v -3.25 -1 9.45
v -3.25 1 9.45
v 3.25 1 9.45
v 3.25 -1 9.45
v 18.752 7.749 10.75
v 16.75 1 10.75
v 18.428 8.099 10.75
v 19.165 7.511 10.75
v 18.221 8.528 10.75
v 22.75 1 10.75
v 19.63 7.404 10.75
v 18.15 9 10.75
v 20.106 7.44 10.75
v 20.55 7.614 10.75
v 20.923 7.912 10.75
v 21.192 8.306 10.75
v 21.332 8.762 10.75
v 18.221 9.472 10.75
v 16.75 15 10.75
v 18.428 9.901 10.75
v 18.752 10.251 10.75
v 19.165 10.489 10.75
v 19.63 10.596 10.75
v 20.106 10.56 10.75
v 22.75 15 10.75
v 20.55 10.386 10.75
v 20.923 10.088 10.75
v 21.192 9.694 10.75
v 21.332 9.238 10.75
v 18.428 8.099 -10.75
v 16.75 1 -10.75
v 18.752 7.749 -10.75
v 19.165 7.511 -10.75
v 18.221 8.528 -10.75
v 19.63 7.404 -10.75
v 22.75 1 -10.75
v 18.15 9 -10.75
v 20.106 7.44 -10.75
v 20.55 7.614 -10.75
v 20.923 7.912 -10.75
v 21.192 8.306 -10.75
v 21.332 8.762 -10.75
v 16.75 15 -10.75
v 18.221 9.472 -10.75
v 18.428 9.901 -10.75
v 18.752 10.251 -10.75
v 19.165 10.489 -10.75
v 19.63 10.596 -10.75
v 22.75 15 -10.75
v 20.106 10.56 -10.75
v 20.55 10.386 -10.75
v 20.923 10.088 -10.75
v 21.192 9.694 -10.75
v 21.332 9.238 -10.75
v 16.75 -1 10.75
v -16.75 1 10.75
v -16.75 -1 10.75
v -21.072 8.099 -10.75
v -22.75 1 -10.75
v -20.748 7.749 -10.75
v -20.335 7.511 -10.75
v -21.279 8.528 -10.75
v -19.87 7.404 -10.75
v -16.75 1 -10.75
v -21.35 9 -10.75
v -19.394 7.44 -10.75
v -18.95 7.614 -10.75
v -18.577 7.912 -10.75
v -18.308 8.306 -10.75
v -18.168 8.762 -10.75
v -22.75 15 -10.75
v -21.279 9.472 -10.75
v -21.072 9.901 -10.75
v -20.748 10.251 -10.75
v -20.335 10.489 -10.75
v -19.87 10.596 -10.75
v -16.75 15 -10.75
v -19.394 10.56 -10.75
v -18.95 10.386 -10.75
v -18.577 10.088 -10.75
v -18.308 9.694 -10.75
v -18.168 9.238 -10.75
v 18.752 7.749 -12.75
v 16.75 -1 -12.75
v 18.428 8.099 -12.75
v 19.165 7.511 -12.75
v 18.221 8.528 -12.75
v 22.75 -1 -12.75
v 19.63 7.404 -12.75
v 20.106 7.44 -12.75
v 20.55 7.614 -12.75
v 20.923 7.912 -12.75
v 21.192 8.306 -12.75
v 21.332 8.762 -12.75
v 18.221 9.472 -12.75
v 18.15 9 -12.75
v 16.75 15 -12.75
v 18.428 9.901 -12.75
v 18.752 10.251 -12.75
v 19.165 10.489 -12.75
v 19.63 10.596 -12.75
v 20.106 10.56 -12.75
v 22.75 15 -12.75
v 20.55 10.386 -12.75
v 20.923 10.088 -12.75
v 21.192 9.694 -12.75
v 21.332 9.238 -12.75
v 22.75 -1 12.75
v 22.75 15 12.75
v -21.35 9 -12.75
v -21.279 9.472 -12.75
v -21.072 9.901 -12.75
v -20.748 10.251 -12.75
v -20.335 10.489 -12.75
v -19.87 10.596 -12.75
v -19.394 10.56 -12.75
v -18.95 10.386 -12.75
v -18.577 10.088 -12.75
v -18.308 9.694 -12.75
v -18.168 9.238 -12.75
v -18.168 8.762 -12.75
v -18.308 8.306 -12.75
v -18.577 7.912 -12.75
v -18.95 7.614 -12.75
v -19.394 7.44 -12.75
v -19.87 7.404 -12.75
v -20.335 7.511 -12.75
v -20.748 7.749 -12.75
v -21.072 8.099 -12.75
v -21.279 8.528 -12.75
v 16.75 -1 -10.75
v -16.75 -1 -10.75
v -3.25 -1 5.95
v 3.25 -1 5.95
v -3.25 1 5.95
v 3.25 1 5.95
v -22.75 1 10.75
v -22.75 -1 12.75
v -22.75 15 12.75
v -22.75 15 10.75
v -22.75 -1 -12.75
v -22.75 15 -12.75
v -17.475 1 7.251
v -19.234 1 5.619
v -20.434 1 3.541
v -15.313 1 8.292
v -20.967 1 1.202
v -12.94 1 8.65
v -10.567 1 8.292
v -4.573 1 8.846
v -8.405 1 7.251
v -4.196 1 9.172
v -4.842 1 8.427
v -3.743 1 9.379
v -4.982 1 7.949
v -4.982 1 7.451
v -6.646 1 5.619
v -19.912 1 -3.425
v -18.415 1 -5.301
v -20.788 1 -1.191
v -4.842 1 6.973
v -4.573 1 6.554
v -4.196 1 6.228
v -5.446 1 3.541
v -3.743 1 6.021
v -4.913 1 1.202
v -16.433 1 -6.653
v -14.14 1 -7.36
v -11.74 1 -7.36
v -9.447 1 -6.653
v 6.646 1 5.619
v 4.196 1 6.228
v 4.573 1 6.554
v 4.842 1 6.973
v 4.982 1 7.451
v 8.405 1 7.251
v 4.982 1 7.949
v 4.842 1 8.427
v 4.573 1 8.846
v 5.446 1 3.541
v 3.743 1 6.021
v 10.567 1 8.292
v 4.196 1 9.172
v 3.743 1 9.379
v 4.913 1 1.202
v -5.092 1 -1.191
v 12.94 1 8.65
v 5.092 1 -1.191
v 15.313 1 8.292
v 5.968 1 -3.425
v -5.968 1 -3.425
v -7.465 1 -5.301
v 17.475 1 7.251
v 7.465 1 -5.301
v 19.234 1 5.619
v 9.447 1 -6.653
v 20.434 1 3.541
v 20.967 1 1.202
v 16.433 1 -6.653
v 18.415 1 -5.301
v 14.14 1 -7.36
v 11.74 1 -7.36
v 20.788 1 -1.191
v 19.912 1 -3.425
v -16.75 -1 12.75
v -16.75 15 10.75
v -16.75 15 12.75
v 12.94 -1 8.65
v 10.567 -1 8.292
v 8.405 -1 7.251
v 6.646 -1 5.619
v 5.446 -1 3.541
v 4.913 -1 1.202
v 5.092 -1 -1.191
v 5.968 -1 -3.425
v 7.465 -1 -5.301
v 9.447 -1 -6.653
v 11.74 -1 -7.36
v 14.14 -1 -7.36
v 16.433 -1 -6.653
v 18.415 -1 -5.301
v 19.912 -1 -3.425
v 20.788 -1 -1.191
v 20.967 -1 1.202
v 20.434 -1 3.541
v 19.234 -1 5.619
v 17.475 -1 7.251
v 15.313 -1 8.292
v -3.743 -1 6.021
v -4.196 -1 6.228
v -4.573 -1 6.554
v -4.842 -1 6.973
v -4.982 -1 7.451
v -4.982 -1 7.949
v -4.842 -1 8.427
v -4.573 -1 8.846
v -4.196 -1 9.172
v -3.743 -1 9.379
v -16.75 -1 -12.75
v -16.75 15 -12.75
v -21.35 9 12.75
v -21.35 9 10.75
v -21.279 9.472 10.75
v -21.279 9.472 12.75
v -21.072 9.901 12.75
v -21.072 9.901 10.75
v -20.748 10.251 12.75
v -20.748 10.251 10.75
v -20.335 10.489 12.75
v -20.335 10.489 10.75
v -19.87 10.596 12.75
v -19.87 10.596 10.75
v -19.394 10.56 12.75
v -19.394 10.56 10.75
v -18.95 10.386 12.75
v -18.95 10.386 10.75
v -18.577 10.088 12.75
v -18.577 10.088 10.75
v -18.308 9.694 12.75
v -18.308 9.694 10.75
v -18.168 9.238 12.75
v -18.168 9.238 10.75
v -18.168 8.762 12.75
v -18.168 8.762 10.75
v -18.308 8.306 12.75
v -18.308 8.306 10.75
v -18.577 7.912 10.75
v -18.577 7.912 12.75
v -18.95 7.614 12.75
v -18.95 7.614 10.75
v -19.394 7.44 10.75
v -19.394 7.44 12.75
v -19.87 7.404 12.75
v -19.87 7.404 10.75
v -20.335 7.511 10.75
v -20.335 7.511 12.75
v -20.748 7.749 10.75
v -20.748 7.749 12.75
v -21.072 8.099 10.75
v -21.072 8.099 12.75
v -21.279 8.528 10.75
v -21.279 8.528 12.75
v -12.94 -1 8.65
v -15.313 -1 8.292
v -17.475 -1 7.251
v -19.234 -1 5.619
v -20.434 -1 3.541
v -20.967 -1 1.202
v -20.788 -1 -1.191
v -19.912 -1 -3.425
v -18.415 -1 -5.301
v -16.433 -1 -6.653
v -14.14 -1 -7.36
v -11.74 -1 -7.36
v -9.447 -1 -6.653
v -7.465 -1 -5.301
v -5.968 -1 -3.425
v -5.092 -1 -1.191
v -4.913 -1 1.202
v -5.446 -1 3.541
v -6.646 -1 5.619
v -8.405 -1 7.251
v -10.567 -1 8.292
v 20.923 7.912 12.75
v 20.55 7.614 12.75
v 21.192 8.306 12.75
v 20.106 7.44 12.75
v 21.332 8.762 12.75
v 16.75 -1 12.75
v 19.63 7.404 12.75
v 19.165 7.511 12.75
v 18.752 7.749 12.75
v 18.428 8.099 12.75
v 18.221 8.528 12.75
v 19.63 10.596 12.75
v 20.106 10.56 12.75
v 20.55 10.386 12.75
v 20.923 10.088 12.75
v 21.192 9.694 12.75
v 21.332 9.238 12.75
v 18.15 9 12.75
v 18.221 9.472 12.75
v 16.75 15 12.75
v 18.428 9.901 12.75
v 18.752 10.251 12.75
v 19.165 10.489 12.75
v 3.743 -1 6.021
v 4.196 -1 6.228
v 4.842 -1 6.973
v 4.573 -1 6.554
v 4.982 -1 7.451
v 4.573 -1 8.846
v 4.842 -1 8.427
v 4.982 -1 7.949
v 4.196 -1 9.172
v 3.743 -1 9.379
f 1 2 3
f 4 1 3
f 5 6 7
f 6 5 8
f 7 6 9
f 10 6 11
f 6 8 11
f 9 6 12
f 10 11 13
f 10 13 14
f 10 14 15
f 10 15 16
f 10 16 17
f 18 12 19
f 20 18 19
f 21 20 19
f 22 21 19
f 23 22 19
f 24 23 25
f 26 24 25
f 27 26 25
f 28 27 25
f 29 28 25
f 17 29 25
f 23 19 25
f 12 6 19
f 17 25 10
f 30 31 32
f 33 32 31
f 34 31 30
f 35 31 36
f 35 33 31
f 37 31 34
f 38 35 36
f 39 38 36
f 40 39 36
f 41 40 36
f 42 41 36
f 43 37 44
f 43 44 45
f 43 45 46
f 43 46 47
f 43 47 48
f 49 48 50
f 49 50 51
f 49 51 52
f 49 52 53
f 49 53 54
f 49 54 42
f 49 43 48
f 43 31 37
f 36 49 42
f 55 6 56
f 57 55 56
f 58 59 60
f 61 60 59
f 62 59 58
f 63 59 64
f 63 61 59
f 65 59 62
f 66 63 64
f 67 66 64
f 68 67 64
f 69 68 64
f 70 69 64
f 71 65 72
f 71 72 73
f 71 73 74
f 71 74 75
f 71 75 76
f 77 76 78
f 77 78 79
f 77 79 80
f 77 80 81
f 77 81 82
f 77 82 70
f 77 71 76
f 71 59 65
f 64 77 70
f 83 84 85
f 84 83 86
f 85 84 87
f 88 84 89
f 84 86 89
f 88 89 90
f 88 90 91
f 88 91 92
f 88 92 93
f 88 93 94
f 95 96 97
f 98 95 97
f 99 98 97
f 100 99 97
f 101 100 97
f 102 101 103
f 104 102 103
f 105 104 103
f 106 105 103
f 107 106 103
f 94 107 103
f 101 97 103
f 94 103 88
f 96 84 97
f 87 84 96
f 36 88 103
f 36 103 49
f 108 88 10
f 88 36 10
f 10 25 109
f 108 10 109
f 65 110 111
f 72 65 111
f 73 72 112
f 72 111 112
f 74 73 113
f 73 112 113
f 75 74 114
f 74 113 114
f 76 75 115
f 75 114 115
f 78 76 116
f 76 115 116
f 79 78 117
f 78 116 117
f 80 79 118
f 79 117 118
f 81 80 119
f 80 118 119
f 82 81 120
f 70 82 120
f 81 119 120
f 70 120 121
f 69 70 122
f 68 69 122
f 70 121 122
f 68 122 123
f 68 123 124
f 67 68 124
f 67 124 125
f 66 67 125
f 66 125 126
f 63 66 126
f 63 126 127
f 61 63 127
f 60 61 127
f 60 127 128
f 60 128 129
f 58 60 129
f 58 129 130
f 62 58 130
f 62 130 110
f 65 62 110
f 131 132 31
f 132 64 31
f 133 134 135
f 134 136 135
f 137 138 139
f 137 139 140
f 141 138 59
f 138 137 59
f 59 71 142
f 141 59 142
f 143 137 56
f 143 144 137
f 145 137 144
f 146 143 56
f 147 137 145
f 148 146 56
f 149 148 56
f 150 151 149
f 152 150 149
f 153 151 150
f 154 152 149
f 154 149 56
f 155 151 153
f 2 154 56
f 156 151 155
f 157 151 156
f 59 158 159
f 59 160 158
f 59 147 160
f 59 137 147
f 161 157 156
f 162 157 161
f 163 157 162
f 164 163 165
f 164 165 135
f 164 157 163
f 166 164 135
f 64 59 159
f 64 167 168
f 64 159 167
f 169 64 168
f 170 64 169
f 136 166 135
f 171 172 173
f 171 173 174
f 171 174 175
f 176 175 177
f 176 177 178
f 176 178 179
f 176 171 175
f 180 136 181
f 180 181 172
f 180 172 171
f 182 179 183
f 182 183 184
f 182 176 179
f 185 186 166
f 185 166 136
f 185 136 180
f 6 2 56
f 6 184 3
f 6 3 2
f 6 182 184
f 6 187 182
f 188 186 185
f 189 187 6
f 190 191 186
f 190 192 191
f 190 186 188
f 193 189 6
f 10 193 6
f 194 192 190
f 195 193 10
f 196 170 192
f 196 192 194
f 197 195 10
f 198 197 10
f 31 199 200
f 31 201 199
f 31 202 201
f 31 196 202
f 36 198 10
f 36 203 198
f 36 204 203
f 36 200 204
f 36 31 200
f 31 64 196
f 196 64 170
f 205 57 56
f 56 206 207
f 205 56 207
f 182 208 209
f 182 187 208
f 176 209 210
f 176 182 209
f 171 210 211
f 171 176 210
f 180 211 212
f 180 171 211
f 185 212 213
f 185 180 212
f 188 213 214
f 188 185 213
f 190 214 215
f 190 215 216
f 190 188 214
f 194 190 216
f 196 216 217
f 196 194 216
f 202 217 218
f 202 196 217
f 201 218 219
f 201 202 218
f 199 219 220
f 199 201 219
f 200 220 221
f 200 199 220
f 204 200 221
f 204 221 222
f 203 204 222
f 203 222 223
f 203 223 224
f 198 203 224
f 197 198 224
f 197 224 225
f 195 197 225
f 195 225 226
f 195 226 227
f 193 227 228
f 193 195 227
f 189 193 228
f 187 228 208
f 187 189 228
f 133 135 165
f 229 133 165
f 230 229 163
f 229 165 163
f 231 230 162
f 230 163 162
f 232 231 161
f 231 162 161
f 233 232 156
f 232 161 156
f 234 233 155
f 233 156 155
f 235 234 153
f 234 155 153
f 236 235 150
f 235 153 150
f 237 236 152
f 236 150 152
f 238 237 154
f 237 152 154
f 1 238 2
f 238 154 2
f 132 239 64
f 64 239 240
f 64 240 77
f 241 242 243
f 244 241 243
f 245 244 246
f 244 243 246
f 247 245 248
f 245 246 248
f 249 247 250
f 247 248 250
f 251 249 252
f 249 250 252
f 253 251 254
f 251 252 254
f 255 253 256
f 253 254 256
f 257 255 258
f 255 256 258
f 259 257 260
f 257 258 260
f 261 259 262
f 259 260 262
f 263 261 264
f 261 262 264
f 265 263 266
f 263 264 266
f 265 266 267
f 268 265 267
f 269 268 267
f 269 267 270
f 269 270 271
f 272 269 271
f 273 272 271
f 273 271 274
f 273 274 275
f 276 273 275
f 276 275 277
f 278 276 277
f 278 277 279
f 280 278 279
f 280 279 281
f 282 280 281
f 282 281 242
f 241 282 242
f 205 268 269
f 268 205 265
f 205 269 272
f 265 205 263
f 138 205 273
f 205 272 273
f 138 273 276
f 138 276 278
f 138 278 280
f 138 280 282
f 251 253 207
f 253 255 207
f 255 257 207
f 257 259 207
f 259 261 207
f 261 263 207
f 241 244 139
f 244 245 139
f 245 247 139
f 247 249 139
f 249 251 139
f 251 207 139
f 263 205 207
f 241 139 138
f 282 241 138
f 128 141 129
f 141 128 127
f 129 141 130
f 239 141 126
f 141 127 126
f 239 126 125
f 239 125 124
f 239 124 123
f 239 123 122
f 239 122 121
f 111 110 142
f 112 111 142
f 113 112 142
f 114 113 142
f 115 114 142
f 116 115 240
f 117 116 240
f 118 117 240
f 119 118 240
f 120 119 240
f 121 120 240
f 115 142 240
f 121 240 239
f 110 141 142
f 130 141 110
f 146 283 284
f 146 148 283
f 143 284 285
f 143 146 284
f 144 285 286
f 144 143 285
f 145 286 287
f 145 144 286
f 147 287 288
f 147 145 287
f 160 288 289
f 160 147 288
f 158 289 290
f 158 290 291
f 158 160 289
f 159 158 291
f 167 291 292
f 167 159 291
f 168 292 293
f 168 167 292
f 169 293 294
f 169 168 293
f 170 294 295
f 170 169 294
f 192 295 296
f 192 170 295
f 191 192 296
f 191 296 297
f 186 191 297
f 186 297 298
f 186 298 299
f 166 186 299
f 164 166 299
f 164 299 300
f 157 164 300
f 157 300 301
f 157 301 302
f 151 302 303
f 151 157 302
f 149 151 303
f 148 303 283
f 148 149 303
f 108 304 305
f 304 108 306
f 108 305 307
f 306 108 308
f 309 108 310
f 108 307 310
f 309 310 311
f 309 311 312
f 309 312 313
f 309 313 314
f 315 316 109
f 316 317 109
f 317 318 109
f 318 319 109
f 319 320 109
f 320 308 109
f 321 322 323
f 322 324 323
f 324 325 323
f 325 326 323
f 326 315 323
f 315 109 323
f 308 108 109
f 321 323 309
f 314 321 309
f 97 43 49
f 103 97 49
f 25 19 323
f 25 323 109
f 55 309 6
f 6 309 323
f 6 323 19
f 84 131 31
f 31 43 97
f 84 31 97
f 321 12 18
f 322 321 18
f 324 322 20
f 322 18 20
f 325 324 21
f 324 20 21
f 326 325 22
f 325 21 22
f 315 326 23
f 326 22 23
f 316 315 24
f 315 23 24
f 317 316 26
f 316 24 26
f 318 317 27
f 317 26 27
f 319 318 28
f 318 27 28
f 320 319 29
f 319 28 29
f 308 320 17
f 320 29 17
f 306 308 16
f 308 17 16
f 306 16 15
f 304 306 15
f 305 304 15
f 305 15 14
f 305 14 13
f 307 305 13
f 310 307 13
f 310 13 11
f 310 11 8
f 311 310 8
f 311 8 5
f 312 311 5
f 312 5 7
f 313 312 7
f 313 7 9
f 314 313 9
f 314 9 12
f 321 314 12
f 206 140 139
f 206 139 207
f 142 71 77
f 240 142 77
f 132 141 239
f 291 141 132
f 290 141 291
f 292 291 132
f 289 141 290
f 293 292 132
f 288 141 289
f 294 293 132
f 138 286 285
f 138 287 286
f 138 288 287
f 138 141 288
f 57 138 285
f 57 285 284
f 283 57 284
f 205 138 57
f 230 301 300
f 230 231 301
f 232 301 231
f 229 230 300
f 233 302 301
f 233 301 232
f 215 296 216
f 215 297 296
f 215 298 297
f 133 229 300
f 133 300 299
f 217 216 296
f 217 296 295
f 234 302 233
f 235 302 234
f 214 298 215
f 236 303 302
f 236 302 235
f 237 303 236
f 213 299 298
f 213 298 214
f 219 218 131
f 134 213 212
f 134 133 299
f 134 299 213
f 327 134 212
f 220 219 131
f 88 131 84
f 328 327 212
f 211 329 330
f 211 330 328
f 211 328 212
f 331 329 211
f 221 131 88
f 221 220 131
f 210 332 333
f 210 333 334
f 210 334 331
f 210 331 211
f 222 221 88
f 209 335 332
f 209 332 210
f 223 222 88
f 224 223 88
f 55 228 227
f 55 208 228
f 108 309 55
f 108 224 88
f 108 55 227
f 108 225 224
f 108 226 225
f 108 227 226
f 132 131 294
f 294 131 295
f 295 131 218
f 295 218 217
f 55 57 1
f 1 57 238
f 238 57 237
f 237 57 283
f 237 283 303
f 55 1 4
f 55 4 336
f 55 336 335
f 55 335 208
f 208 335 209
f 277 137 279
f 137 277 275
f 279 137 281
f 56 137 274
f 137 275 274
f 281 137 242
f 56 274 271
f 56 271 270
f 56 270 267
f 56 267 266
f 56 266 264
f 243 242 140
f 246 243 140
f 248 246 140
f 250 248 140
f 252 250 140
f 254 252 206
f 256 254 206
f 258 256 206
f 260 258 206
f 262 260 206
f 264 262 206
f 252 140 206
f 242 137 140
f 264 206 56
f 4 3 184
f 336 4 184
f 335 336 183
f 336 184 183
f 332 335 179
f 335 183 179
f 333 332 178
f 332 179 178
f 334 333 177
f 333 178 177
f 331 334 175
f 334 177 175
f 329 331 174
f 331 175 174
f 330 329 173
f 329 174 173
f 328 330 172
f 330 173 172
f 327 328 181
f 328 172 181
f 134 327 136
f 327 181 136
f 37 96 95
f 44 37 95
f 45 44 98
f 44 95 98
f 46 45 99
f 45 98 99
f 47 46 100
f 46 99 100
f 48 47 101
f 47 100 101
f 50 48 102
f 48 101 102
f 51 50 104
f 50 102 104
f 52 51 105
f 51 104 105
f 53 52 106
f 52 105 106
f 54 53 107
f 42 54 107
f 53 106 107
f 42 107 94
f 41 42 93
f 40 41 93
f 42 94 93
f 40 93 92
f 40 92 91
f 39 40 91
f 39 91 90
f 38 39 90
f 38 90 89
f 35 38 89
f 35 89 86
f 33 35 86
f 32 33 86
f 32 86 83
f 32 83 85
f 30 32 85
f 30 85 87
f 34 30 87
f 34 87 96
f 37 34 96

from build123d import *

# Parameters (mm, degrees)
SKETCH_1_W          = 45.5
SKETCH_1_H          = 21.5
EXTRUDE_1_DEPTH     = 1
SKETCH_2_W          = 6
SKETCH_2_H          = 15
EXTRUDE_2_DEPTH     = 2
SKETCH_3_R          = 8.05
CUT_EXTRUDE_1_DEPTH = 30.599408778
CUT_EXTRUDE_2_DEPTH = 30.599408778
SKETCH_5_R          = 1.6
CUT_EXTRUDE_3_DEPTH = 38.320403267
SKETCH_6_R          = 8.05
EXTRUDE_3_DEPTH     = 1


with BuildPart() as part:
    # 草圖1 → 填料-伸長1 (new body)
    with BuildSketch(Plane(origin=(0, 0, 0), x_dir=(1, 0, 0), z_dir=(0, 1, 0))):
        Rectangle(SKETCH_1_W, SKETCH_1_H)
    extrude(amount=EXTRUDE_1_DEPTH)

    # 草圖2 → 填料-伸長2 (add)
    with BuildSketch(Plane.XY.offset(10.75)):
        with Locations((-19.75, 7.5)):
            Rectangle(SKETCH_2_W, SKETCH_2_H)
        with Locations((19.75, 7.5)):
            Rectangle(SKETCH_2_W, SKETCH_2_H)
    extrude_2 = extrude(amount=EXTRUDE_2_DEPTH)

    # 鏡射1: 填料-伸長2 across plane
    add(extrude_2.mirror(Plane.XY))

    # 草圖3 → 除料-伸長1 (cut, through all)
    with BuildSketch(Plane(origin=(0, 1, 0), x_dir=(1, 0, 0), z_dir=(0, 1, 0))):
        with Locations(Location((-12.94, -0.6, 0), (0, 0, 270))):
            Circle(SKETCH_3_R)
        with Locations(Location((12.94, -0.6, 0), (0, 0, 270))):
            Circle(SKETCH_3_R)
    extrude(amount=-CUT_EXTRUDE_1_DEPTH, mode=Mode.SUBTRACT)

    # 草圖4 → 除料-伸長2 (cut, through all)
    with BuildSketch(Plane(origin=(0, 1, 0), x_dir=(1, 0, 0), z_dir=(0, 1, 0))):
        with BuildLine():
            Line((-3.25, -5.95), (3.25, -5.95))
            ThreePointArc((3.25, -5.95), (5, -7.7), (3.25, -9.45))
            Line((3.25, -9.45), (-3.25, -9.45))
            ThreePointArc((-3.25, -9.45), (-5, -7.7), (-3.25, -5.95))
        make_face()
    extrude(amount=-CUT_EXTRUDE_2_DEPTH, mode=Mode.SUBTRACT)

    # 草圖5 → 除料-伸長3 (cut, through all)
    with BuildSketch(Plane(origin=(0, 0, -12.75), x_dir=(-1, 0, 0), z_dir=(0, 0, -1))):
        with Locations((19.75, 9)):
            Circle(SKETCH_5_R)
        with Locations((-19.75, 9)):
            Circle(SKETCH_5_R)
    extrude(amount=-CUT_EXTRUDE_3_DEPTH, mode=Mode.SUBTRACT)

    # 草圖6 → 填料-伸長3 (add)
    with BuildSketch(Plane.XZ):
        Polygon((-22.75, 12.75), (-22.75, -12.75), (-16.75, -12.75), (-16.75, -10.75), (16.75, -10.75), (16.75, -12.75), (22.75, -12.75), (22.75, 12.75), (16.75, 12.75), (16.75, 10.75), (-16.75, 10.75), (-16.75, 12.75), align=None)
        with Locations(Location((-12.94, 0.6, 0), (0, 0, 90))):
            Circle(SKETCH_6_R, mode=Mode.SUBTRACT)
        with Locations(Location((12.94, 0.6, 0), (0, 0, 90))):
            Circle(SKETCH_6_R, mode=Mode.SUBTRACT)
        with BuildLine():
            Line((3.25, 5.95), (-3.25, 5.95))
            ThreePointArc((-3.25, 5.95), (-5, 7.7), (-3.25, 9.45))
            Line((-3.25, 9.45), (3.25, 9.45))
            ThreePointArc((3.25, 9.45), (5, 7.7), (3.25, 5.95))
        make_face(mode=Mode.SUBTRACT)
    extrude(amount=EXTRUDE_3_DEPTH)


solid = part.part
